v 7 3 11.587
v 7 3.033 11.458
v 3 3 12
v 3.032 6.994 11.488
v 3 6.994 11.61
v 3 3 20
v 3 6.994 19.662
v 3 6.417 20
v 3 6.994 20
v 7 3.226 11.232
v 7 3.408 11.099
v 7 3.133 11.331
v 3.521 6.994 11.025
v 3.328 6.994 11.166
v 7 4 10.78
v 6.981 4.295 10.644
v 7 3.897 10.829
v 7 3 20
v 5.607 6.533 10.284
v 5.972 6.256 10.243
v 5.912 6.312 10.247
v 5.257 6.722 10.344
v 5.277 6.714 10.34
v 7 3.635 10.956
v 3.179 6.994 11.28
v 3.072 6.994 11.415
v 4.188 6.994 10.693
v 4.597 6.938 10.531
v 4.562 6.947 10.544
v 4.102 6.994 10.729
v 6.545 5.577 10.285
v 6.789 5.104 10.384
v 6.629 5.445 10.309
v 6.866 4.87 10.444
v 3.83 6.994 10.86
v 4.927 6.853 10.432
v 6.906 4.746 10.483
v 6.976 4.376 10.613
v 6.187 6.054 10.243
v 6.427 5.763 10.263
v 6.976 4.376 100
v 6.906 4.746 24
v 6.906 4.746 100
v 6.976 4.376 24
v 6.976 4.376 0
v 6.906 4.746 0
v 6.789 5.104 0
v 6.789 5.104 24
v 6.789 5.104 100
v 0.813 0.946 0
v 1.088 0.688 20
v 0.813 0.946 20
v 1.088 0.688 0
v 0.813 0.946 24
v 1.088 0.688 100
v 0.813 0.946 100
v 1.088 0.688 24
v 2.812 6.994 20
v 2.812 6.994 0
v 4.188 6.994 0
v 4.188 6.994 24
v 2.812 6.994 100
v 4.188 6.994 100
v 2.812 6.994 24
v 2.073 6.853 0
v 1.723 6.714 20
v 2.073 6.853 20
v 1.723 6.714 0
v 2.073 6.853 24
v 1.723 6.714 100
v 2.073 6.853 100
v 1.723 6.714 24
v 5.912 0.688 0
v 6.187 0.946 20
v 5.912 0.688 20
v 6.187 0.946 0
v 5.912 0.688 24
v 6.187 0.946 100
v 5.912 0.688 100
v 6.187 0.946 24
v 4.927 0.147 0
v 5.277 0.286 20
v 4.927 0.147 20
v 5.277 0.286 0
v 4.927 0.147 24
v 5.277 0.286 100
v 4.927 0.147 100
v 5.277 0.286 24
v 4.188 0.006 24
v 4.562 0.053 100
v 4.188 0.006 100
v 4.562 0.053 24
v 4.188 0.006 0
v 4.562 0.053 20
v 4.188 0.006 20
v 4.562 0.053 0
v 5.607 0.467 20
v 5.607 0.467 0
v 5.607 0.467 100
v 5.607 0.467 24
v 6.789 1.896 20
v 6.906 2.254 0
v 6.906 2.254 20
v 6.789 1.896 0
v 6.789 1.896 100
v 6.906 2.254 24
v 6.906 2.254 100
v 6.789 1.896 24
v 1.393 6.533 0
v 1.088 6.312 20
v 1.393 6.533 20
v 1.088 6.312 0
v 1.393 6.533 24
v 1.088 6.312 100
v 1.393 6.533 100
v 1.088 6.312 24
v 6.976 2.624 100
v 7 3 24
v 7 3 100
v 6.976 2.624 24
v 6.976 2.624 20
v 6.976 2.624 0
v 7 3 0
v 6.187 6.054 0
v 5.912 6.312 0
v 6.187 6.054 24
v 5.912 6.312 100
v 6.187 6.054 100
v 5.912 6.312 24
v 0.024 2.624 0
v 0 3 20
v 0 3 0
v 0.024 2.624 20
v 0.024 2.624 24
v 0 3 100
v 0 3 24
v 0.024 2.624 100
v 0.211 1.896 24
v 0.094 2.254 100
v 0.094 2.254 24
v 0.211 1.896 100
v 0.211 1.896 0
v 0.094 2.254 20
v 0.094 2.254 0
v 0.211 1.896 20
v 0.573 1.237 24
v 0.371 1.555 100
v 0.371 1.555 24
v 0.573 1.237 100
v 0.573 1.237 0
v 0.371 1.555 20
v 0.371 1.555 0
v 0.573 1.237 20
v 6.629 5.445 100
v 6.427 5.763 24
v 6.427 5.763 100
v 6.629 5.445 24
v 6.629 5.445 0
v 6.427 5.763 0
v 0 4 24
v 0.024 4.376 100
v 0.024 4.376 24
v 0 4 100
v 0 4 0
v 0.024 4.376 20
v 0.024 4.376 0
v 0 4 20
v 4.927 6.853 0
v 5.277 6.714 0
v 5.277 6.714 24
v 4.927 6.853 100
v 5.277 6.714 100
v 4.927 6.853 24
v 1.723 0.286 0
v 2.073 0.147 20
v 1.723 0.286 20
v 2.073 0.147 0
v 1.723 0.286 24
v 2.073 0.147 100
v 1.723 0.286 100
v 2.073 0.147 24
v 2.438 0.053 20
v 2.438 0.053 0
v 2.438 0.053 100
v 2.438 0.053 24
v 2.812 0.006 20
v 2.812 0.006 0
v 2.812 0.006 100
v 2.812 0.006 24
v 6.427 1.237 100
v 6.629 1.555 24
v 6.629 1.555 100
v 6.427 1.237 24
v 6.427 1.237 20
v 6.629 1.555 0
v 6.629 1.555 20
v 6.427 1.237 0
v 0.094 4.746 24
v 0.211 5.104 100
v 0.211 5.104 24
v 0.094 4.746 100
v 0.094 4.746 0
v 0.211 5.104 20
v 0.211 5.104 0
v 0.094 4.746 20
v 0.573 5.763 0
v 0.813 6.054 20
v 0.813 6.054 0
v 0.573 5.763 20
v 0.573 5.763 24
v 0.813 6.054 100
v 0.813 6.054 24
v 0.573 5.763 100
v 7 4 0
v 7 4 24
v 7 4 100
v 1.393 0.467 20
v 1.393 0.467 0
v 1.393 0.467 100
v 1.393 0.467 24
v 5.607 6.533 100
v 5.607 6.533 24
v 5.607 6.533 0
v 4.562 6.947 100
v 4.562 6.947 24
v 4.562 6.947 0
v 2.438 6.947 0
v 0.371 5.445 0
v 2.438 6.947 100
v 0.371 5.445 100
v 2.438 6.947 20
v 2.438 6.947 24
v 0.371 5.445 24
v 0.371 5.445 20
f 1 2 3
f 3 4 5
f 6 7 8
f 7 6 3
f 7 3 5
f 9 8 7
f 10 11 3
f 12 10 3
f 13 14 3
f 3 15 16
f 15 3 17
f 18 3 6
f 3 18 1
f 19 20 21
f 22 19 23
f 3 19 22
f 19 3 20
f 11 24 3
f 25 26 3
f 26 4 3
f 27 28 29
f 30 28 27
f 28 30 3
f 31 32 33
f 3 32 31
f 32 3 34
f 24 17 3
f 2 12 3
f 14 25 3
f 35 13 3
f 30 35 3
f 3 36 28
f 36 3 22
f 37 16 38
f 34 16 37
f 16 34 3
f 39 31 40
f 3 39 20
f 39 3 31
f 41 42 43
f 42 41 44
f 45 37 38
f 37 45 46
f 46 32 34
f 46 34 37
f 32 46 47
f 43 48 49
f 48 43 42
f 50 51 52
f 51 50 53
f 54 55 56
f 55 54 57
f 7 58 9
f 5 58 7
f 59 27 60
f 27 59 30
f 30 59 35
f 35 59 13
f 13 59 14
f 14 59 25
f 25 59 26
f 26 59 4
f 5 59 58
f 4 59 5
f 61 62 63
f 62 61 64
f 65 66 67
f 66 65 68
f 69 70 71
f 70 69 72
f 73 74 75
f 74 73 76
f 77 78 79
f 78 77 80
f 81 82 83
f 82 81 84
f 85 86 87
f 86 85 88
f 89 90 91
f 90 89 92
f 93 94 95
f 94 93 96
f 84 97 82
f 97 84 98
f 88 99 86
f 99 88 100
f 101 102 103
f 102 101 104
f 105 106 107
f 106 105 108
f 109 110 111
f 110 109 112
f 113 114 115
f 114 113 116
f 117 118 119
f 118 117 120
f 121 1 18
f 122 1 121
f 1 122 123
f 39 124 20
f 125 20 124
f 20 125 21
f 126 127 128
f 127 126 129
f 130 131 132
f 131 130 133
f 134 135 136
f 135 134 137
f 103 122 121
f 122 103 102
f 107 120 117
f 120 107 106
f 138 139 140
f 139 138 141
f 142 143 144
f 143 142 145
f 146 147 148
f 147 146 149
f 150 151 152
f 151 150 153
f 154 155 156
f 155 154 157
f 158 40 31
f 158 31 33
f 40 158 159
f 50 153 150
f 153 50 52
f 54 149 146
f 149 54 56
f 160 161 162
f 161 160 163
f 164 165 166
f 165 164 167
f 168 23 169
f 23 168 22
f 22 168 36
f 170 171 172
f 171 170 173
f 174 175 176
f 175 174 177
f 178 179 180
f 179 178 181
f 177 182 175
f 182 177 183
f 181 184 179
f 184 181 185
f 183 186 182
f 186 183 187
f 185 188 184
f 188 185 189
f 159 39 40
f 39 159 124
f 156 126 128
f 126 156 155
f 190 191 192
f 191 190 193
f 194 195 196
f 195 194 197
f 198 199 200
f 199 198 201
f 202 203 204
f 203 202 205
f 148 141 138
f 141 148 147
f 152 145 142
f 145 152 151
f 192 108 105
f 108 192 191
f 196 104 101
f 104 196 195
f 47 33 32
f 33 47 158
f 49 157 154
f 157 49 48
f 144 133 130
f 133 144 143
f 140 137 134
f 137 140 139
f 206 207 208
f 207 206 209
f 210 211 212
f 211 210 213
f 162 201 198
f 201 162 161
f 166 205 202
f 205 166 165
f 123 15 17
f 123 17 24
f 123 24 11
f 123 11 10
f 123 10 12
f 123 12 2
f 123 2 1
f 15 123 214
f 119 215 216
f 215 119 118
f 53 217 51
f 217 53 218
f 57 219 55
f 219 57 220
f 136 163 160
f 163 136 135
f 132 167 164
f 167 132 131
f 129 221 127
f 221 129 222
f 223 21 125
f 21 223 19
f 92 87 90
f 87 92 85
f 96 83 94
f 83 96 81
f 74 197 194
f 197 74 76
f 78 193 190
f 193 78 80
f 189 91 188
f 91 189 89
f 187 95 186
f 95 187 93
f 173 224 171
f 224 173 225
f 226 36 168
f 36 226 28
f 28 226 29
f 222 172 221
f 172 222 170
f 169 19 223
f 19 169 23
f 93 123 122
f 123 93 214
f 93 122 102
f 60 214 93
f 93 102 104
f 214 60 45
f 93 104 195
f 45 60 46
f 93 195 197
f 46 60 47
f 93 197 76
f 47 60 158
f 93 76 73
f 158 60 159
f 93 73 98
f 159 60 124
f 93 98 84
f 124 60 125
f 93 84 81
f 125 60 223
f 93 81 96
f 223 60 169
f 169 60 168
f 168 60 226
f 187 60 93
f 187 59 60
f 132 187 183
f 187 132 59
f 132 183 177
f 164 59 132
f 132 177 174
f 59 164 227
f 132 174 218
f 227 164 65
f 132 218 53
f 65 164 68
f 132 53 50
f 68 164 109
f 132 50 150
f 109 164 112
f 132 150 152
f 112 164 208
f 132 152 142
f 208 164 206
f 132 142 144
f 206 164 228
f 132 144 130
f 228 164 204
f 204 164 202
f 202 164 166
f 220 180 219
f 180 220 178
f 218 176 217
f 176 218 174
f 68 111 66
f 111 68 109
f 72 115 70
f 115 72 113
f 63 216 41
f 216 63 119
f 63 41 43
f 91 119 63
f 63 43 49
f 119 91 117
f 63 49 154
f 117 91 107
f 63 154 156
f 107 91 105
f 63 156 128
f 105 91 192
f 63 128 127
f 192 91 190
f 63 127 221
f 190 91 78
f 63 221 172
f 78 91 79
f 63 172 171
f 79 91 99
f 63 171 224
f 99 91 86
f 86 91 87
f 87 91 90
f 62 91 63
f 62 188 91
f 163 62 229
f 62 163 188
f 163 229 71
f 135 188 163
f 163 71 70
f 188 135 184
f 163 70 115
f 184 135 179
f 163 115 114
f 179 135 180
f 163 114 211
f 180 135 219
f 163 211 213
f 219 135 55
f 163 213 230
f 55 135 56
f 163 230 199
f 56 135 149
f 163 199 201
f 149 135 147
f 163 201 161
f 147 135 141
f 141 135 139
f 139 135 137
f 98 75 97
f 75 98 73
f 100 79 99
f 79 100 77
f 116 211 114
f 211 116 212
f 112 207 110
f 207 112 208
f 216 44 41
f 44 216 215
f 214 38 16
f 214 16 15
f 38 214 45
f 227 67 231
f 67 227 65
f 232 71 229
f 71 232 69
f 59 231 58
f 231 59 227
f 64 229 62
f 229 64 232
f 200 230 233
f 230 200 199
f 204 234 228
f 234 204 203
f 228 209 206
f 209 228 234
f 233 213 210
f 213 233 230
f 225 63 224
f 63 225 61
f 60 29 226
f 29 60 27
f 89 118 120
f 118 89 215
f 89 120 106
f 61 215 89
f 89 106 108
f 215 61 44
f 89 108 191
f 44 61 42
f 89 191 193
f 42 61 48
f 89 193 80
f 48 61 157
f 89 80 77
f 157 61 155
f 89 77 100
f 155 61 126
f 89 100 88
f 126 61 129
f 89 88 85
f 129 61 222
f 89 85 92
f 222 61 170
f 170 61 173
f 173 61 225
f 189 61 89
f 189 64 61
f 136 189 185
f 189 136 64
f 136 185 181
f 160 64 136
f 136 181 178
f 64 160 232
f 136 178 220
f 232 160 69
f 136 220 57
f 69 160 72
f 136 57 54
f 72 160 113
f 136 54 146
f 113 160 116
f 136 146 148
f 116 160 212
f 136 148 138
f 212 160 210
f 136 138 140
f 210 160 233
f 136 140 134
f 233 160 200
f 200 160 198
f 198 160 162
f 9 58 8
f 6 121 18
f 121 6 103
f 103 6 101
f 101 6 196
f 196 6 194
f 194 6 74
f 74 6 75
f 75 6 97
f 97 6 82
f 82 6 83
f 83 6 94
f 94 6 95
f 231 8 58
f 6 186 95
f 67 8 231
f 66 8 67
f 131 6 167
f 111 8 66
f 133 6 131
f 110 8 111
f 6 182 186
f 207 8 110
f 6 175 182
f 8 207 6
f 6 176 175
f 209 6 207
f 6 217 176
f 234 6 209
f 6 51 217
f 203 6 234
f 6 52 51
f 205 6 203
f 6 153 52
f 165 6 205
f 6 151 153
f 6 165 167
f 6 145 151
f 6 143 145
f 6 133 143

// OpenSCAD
// file: ../../lib/util_functions.scad
function sum(v) = [for(p = v) 1] * v;

function take_sum(v, i) = i == 0 
  ? 0 
  : sum([for (a = [0:i-1]) v[a]]);

// input : nested list
// output : list with the outer level nesting removed
function flatten(l) = [ for (a = l) for (b = a) b ] ;
// file: ../../lib/rounded_square.scad
$bleed = 1;
$rounding = 3;

module rounded_square(size) {
  inner_size = [
    size[0] - $rounding * 2,
    size[1] - $rounding * 2,
  ];

  minkowski() {
    translate([$rounding, $rounding, 0]) {
      square(inner_size);
    }
    circle($rounding);
  }
}
// file: ../../lib/grid_layout.scad
include <./util_functions.scad>

$wall_thickness = 2;

function total_wall_size(count = 1) = (count + 1) * $wall_thickness;

function usable_size(length, count = 1) = length - total_wall_size(count);

function item_size(length, count = 1, i = 0) = usable_size(length, count) / count;

function axis_offset(v, i) = take_sum(v, i) + $wall_thickness * i;

// Get the offset to place the item at the given grid position
function grid_offset(grid, pos) = [
  axis_offset(grid[0], pos[0] ? pos[0] : 0), 
  axis_offset(grid[1], pos[1] ? pos[1] : 0), 
  axis_offset(grid[2], pos[2] ? pos[2] : 0), 
];

// Get the size of the item at given grid position
function grid_size(grid, pos) = [
  grid[0][pos[0] ? pos[0]: 0],
  grid[1][pos[1] ? pos[1]: 0],
  grid[2][pos[2] ? pos[2]: 0],
];

// Make an evenly split grid
function make_even_grid(size, cols, rows) = [
  [for (i=[0:cols-1]) item_size(size[0], cols)],
  [for (i=[0:rows-1]) item_size(size[1], rows)],
  [size[2]],
];

// TODO items that take 100% of an axis wont ever have a value
// totally unable to handle differing rows / columns
// revert to lower level functions for manual placements
// file: ../../lib/rounded_cube.scad
include <./rounded_square.scad>

$bleed = 1;
$rounding = 3;

// Render a rounded cube
// flat_top: do not round the top edges
// flat_bottom: do not round the bottom edges
// flat: equals flat_top && flat_bottom
// 
// Limitations:
// requires height > $rounding * 2
// flat_top || flat_bottom requires height > $rounding
// flat_top && flat_bottom requires height > $bleed
module rounded_cube(
  size, 
  flat=false, 
  flat_top=false, 
  flat_bottom=false,
  side_rounding=-1
) {
  _flat = flat || (flat_top && flat_bottom);
  _flat_top = flat_top || flat;
  _flat_bottom = flat_bottom || flat;
  _rounding = min($rounding, size[2] / 2);
  _side_rounding = side_rounding > -1 ? side_rounding: $rounding;

  assert(_side_rounding >= $rounding, "side rounding cannot be less than rounding");

  top_height = _flat_top ? 0: _rounding;
  bottom_height = _flat_bottom ? 0: _rounding;

  cube_size = [
    size[0] - _rounding * 2,
    size[1] - _rounding * 2,
    size[2] - (top_height + bottom_height)
  ];

  if (_flat_top && _flat_bottom) {
     linear_extrude(cube_size[2]) {
       rounded_square([size[0], size[1]]);
     }
  } else {
    minkowski() {
      translate([_rounding, _rounding, bottom_height]) {
        if (_side_rounding != _rounding) {
          linear_extrude(cube_size[2]) {
            rounded_square([cube_size[0], cube_size[1]], $rounding=_side_rounding);
          }
        } else {
          cube(cube_size);
        }
      }

      if (_flat_top) {
        difference() {
          sphere(_rounding);
          cylinder(_rounding, _rounding, _rounding);
        }
      } else if (_flat_bottom) {
        difference() {
          sphere(_rounding);
          translate ([0, 0, -_rounding]) {
            cylinder(_rounding, _rounding, _rounding);
          }
        }
      } else {
        sphere(_rounding);
      }
    }
  }
}
// file: ../../lib/grid_dish.scad
include <./dish.scad>
include <./grid_layout.scad>

module grid_dish(grid, pos) {
  translate(grid_offset(grid, pos)) {
    dish(grid_size(grid, pos));
  }
}
// file: ../../lib/dish.scad
include <./rounded_cube.scad>

$rounding = 3;
$bleed = 1;
$lid_height = 2;

default_dish_ratio = 0.5;

module dish (size, dish_ratio=default_dish_ratio, lid=false) {
  width = size[0];
  length = size[1];
  height = size[2];

  r_width = width - $rounding * 2;
  r_length = length - $rounding * 2;
  r_height = height - $rounding * 2;
  cube_ratio = 1 - dish_ratio;

  radius = min(r_width,r_length);

  position = [
    0,
    0,
    lid ? -$lid_height : 0,
  ];

  translate(position) {
    // difference() {
      translate([$rounding,$rounding,$rounding]) {
        // minkowski() {
          hull() {
            translate([0,0,height * dish_ratio - $rounding]) {
              cube([r_width,r_length,height * cube_ratio]);
            }
            translate([r_width/2,r_length/2,height * dish_ratio / 2]) {
              resize([r_width,r_length,height * dish_ratio]) {
                sphere(radius);
              }
            }
          }
          // sphere($rounding);
        // }
      }

      translate([-$bleed,-$bleed,height]) {
        /*
        cube([
          width + $bleed * 2,
          length + $bleed * 2,
          $rounding + $bleed
        ]);
        */
      }
    }
  // }
}
// file: ../../lib/layout.scad
$wall_thickness = 2;

function wall_offset(count = 1, i = 0) = (i + 1) * $wall_thickness;

function total_wall_size(count = 1) = (count + 1) * $wall_thickness;

function usable_size(size, count = 1) = size - total_wall_size(count);

function item_size(size, count = 1, i = 0) = usable_size(size, count) / count;

function item_offset(size, count = 1, i = 0) = wall_offset(count, i) + item_size(size, count, i) * i;

module spread_width(width) {
  echo("children: ", $children);
  for(i=[0 : $children - 1]) {
    offset = item_offset(width, $children, i);
    translate([offset, 0, 0]) {
      children(i);
    }
  }
}

module spread_length(length) {
  for(i=[0 : $children - 1]) {
    offset = item_offset(length, $children, i);
    translate([0, offset, 0]) {
      children(i);
    }
  }
}
// file: ../../lib/cutout_tray.scad
include <./rounded_cube.scad>

$bleed = 1;
$rounding = 3;
$wall_thickness = 2;

module cutout_tray(size) {
  width = size[0];
  length = size[1];
  height = size[2];

  difference() {
    // Base tray
    rounded_cube(width, length, height+$rounding+$bleed);

    // Cutouts
    translate([0, 0, $wall_thickness]) {
      children();
    }
 
    // Slice off top
    translate([-$bleed,-$bleed,height]) {
      cube([
        width + $bleed * 2, 
        length + $bleed * 2, 
        $rounding + $bleed
      ]);
    }
  }
}
// main file
echo(version=version());

include <../../lib/cutout_tray.scad>
include <../../lib/layout.scad>
include <../../lib/dish.scad>
include <../../lib/grid_dish.scad>

// Config
$fn = 50;
$wall_thickness = 2;

// Attributes

size = [
  150,
  100,
  20
];

grid = make_even_grid(size, 3, 2);

// Model

cutout_tray(size) {
  grid_dish(grid, [0, 0]);
  grid_dish(grid, [0, 1]);

  grid_dish(grid, [1, 0]);
  grid_dish(grid, [1, 1]);

  grid_dish(grid, [2, 0]);
  grid_dish(grid, [2, 1]);
}
